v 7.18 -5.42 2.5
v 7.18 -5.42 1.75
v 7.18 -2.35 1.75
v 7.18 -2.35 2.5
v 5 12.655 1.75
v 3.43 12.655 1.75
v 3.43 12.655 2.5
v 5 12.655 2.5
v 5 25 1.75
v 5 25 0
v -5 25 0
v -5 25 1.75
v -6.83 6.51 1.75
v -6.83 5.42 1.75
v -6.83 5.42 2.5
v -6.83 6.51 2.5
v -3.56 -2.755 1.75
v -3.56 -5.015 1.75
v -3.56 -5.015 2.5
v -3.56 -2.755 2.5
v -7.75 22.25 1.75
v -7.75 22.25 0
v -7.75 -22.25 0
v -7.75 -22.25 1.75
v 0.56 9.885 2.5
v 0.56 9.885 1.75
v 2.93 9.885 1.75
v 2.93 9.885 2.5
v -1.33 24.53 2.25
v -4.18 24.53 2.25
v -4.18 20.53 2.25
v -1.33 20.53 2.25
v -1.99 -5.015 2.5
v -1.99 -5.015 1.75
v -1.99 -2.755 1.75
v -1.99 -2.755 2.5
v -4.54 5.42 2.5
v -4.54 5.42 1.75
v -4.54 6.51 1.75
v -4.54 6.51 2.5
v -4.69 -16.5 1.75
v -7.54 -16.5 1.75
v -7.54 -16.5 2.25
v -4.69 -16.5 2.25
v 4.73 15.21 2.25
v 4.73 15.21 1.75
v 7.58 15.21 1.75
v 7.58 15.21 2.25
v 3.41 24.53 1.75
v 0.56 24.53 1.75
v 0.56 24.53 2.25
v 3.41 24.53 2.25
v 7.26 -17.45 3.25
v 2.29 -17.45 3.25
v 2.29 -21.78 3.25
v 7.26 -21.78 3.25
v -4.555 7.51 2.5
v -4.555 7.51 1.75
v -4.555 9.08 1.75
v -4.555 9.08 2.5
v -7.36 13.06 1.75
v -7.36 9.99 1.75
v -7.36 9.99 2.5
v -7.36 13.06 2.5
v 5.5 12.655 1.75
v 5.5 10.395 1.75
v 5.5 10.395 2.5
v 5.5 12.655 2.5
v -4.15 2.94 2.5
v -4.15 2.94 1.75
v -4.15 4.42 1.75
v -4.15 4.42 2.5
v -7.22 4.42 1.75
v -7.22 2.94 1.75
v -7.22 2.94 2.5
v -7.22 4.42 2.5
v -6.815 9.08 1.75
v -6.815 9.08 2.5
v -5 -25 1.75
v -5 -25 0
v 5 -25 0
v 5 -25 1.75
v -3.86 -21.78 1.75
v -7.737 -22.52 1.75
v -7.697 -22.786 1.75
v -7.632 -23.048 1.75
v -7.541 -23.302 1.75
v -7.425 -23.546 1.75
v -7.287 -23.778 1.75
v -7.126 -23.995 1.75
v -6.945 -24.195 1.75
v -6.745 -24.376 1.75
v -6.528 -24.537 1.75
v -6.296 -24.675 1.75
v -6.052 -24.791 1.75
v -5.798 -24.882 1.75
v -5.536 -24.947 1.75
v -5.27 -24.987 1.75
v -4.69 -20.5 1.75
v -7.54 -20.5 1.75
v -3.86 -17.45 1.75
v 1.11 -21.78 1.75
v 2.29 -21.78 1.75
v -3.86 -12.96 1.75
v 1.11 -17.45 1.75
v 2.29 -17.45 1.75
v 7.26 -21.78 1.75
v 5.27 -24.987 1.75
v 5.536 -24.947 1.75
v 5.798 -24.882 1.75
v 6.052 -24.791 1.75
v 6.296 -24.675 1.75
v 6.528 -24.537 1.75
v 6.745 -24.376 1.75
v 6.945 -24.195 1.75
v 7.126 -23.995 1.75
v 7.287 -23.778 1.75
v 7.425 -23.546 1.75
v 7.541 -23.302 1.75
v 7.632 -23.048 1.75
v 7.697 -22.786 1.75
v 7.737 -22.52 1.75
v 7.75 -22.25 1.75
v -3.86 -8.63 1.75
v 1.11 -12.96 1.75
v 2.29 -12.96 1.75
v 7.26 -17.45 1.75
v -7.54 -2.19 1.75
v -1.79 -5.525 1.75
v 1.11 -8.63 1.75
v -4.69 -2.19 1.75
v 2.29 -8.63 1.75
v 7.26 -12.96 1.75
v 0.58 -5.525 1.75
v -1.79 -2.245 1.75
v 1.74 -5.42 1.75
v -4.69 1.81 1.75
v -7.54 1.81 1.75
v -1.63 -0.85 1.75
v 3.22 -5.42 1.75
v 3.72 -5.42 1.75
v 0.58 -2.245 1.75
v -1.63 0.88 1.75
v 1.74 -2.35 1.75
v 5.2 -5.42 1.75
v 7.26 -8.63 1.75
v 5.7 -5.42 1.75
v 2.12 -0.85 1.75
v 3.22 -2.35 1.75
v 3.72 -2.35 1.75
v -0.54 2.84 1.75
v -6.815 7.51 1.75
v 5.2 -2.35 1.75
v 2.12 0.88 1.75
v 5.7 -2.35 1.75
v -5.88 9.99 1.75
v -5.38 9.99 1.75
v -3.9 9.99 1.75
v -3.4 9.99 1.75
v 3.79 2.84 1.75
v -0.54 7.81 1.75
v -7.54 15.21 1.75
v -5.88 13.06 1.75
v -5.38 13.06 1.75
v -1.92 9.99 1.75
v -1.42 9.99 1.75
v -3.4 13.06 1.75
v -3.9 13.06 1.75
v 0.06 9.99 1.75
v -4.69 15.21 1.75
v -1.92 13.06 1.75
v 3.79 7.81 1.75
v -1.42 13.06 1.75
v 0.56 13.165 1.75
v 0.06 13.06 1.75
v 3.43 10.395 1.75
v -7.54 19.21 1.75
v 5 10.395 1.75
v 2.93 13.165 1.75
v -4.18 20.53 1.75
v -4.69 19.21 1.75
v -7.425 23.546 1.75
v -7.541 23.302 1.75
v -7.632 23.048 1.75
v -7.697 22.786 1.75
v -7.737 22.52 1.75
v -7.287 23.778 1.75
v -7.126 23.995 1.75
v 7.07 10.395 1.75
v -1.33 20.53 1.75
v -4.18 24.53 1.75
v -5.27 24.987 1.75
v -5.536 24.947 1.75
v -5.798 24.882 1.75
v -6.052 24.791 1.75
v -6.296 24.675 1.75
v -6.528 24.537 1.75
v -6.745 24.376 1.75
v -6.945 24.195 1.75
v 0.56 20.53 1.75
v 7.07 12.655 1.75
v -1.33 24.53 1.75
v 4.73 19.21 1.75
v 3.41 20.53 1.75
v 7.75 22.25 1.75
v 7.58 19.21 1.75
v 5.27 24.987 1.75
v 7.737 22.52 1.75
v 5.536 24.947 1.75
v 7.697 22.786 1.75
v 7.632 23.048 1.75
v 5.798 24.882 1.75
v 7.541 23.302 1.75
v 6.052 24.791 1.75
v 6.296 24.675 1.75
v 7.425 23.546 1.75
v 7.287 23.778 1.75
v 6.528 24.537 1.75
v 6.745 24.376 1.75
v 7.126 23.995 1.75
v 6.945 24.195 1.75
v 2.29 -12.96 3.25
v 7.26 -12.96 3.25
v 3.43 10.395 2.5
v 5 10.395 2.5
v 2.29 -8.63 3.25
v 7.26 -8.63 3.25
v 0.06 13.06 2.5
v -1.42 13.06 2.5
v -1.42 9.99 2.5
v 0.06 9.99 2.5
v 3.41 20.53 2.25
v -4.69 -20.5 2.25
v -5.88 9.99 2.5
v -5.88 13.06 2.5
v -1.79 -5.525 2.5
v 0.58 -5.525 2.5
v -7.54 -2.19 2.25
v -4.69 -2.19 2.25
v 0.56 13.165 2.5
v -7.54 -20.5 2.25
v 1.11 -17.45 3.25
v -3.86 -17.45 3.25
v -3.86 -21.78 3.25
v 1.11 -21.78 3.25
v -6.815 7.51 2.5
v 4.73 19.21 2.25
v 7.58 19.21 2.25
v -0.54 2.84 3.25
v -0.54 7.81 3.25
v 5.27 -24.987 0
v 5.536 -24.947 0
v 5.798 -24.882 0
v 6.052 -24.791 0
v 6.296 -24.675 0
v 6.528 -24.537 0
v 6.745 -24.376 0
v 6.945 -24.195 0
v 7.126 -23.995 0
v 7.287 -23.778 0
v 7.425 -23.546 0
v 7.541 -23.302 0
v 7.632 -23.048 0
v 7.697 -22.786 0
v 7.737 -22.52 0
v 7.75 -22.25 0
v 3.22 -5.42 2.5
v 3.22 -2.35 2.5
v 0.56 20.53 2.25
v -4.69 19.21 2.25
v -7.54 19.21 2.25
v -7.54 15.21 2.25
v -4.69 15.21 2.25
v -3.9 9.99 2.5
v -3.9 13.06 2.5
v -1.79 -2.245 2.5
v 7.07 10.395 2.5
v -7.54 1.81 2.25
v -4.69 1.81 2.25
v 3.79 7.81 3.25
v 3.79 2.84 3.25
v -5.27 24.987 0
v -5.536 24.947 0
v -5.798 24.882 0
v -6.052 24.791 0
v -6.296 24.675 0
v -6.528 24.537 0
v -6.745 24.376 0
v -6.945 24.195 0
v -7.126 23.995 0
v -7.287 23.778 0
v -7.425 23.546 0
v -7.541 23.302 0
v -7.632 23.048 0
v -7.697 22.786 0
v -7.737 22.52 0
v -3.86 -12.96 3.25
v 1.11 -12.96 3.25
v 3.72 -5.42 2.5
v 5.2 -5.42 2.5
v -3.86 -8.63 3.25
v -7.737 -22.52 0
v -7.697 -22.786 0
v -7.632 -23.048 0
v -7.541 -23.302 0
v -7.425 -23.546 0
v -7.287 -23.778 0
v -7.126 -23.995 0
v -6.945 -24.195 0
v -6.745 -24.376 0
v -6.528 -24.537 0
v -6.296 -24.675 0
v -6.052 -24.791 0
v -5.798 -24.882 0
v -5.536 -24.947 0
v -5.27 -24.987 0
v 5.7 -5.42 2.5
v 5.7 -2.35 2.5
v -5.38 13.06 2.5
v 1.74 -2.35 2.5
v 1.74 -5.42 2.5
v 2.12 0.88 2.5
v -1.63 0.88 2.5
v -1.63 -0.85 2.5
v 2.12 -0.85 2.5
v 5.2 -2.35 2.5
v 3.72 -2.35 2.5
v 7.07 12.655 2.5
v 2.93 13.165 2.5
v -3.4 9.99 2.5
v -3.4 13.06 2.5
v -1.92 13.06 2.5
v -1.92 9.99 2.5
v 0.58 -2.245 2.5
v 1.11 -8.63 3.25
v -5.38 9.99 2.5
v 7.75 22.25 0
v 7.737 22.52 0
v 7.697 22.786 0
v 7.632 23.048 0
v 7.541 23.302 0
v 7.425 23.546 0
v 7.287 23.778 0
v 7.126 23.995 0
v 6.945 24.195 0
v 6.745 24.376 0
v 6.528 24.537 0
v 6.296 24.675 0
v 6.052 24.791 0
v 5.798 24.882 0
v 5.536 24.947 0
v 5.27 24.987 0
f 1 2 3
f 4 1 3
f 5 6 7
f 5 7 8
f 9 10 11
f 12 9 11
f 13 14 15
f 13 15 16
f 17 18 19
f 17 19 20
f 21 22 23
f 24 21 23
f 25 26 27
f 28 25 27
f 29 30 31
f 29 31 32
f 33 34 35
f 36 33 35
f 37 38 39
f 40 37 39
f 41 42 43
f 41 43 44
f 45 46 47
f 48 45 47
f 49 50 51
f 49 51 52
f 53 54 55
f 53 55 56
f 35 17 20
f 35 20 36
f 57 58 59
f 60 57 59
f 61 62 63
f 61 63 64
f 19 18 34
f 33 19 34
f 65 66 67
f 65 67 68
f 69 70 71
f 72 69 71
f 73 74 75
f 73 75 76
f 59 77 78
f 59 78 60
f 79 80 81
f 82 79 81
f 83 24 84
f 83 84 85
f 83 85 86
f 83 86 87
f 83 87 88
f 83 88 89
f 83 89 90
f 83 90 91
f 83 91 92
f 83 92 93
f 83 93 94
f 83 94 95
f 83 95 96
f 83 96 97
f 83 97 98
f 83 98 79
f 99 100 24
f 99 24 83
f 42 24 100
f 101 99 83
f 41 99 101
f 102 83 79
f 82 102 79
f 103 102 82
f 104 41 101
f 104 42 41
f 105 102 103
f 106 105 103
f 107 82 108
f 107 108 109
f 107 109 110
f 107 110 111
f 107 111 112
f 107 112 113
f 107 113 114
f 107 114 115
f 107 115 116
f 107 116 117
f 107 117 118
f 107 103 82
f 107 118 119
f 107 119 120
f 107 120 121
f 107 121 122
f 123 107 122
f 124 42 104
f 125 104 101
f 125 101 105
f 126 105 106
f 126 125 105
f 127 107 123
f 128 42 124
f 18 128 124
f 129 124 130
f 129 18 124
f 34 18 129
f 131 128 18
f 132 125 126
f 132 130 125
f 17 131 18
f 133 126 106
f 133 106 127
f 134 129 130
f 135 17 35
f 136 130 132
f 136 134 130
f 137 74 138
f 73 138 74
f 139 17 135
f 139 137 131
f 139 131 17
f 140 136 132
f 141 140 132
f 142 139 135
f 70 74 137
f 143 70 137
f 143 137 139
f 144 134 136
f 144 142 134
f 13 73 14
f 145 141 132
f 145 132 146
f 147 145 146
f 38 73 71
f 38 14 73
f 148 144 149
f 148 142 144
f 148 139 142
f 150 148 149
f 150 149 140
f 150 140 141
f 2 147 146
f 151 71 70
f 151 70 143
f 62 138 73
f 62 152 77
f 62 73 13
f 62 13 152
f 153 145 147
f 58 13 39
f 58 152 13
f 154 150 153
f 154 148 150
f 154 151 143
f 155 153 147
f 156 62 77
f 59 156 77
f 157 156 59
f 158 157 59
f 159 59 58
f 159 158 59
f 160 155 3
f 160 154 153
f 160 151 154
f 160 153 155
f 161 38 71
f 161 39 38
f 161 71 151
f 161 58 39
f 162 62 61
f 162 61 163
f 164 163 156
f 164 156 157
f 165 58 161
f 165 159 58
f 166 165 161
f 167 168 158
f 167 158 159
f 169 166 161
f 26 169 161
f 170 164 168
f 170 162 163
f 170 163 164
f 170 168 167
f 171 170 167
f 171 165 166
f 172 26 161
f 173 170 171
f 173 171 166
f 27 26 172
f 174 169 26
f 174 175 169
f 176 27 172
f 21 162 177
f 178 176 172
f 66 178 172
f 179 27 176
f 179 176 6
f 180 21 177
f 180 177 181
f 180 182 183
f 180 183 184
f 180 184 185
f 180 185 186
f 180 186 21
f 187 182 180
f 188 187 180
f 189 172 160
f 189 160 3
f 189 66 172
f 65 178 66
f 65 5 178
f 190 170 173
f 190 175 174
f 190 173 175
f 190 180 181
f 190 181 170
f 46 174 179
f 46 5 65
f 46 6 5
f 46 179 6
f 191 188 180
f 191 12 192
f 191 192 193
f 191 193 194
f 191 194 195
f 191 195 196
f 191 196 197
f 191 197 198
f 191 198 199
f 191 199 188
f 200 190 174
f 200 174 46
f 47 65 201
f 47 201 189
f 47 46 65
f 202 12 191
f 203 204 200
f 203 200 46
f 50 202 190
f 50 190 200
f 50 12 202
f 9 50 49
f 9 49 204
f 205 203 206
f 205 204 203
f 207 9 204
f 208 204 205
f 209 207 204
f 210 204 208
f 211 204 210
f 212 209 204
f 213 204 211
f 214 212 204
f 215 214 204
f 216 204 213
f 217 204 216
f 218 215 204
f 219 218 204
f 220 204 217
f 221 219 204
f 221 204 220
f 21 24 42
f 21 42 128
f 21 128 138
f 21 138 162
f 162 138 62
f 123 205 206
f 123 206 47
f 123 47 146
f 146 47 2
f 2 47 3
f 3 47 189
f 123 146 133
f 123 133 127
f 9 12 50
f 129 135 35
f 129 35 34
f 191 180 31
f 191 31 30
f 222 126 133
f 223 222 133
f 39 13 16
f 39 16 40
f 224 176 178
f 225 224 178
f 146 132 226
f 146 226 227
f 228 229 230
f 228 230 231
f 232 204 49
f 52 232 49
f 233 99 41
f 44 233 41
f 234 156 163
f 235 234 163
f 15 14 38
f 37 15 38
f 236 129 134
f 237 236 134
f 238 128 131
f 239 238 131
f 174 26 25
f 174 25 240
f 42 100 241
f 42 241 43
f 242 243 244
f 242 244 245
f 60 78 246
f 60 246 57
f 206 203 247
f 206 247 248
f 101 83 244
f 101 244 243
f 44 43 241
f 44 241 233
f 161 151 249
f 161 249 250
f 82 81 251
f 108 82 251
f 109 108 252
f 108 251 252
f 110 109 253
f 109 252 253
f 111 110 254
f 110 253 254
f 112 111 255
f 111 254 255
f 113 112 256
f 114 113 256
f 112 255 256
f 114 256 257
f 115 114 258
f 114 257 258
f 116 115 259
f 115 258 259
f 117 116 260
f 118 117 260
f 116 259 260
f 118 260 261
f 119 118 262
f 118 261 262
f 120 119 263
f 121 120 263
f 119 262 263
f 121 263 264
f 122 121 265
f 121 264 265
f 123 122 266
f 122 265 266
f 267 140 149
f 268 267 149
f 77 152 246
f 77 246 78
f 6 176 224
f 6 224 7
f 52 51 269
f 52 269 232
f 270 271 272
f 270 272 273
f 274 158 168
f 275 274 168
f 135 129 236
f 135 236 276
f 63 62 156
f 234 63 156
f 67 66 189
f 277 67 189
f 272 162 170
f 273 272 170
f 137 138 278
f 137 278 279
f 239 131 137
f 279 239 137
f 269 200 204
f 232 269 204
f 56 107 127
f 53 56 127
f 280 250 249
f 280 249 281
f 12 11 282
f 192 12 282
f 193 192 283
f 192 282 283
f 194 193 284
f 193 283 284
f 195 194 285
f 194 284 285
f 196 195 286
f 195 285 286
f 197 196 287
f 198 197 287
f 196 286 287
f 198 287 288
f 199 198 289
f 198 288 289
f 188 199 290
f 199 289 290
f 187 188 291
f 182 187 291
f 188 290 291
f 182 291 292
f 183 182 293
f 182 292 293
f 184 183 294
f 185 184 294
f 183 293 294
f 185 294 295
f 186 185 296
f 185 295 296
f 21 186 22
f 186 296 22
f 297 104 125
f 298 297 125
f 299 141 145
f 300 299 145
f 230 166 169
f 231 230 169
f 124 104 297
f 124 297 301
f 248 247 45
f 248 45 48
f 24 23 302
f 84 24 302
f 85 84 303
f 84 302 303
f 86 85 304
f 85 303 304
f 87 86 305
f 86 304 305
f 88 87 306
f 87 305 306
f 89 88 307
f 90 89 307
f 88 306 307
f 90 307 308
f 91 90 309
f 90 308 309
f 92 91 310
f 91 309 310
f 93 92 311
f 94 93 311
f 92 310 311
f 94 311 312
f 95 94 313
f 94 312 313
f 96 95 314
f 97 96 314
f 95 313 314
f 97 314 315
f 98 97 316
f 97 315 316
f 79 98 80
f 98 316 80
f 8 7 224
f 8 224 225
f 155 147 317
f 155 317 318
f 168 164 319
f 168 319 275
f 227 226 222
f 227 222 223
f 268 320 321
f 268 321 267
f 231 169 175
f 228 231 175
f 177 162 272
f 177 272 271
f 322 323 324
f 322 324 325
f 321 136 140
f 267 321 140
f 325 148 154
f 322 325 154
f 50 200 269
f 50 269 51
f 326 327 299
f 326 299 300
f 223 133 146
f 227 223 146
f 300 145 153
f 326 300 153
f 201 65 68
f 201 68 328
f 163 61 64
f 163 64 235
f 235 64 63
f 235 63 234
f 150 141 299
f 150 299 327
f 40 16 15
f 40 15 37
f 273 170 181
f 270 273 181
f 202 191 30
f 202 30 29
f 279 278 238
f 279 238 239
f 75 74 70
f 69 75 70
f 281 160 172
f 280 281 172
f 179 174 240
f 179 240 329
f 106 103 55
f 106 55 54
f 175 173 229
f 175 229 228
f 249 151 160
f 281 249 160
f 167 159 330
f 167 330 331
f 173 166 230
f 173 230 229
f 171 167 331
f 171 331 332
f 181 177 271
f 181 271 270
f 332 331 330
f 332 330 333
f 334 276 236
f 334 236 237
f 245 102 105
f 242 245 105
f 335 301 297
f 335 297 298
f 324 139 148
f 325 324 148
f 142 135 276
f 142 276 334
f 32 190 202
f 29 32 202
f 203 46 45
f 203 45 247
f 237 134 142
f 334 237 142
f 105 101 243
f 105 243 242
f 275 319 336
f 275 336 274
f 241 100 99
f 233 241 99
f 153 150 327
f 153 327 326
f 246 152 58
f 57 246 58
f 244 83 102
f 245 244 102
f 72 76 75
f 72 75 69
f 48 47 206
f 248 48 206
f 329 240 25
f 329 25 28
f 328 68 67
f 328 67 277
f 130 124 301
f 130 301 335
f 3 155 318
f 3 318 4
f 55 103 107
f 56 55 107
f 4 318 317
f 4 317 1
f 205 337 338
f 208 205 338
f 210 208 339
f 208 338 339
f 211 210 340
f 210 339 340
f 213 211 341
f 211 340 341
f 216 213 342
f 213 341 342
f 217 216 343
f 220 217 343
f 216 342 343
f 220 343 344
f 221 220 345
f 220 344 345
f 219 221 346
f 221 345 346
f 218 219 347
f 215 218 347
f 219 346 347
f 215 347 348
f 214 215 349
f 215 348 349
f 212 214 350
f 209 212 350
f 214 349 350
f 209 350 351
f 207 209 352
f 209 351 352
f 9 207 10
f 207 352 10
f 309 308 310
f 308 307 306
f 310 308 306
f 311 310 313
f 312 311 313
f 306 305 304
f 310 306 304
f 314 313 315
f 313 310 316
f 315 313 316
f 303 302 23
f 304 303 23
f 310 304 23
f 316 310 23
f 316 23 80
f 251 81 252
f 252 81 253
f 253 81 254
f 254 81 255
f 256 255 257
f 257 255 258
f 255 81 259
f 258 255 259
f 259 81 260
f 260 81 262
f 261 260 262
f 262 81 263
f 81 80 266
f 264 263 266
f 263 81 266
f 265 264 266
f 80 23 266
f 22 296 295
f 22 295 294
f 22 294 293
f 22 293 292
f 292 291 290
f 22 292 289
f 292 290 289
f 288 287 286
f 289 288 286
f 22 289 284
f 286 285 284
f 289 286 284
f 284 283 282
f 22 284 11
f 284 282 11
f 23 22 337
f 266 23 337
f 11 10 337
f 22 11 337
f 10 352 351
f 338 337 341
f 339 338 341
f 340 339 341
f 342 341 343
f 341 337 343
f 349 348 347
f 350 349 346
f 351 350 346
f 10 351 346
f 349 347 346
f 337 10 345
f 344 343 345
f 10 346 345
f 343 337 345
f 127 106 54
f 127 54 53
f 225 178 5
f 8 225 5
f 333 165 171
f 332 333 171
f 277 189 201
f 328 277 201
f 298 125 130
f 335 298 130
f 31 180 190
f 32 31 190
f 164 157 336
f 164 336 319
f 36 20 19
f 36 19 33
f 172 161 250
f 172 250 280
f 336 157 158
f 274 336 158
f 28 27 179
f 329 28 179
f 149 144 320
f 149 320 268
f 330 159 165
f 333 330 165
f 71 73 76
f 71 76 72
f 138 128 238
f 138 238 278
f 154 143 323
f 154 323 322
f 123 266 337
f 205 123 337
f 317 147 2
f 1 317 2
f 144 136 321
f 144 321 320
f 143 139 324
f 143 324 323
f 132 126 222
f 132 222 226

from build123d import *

# Parameters (mm, degrees)
PAD_DEPTH     = 1.75
SKETCH001_W   = 2.85
SKETCH001_H   = 4
PAD001_DEPTH  = 0.5
SKETCH002_W   = 4.33
SKETCH002_H   = 4.97
SKETCH002_W_2 = 4.97
SKETCH002_H_2 = 4.33
PAD002_DEPTH  = 1.5
SKETCH003_W   = 1.57
SKETCH003_H   = 2.26
SKETCH003_W_2 = 2.37
SKETCH003_H_2 = 3.28
SKETCH003_W_3 = 1.48
SKETCH003_H_3 = 3.07
SKETCH003_W_4 = 2.29
SKETCH003_H_4 = 1.09
SKETCH003_W_5 = 2.26
SKETCH003_H_5 = 1.57
SKETCH003_W_6 = 3.07
SKETCH003_H_6 = 1.48
SKETCH003_W_7 = 3.75
SKETCH003_H_7 = 1.73
PAD003_DEPTH  = 0.75


with BuildPart() as part:
    # Sketch → Pad (new body)
    with BuildSketch(Plane.XY):
        with BuildLine():
            Line((-7.75, 22.25), (-7.75, -22.25))
            ThreePointArc((-7.75, -22.25), (-6.944544, -24.194544), (-5, -25))
            Line((-5, -25), (5, -25))
            ThreePointArc((5, -25), (6.944544, -24.194544), (7.75, -22.25))
            Line((7.75, -22.25), (7.75, 22.25))
            ThreePointArc((7.75, 22.25), (6.944544, 24.194544), (5, 25))
            Line((5, 25), (-5, 25))
            ThreePointArc((-5, 25), (-6.944544, 24.194544), (-7.75, 22.25))
        make_face()
    extrude(amount=PAD_DEPTH)

    # Sketch001 (on Face10 of Pad) → Pad001 (join)
    with BuildSketch(Plane.XY.offset(1.75)):
        with Locations((-6.115, 17.21)):
            Rectangle(SKETCH001_W, SKETCH001_H)
        with Locations((-2.755, 22.53)):
            Rectangle(SKETCH001_W, SKETCH001_H)
        with Locations((1.985, 22.53)):
            Rectangle(SKETCH001_W, SKETCH001_H)
        with Locations((6.155, 17.21)):
            Rectangle(SKETCH001_W, SKETCH001_H)
        with Locations((-6.115, -0.19)):
            Rectangle(SKETCH001_W, SKETCH001_H)
        with Locations((-6.115, -18.5)):
            Rectangle(SKETCH001_W, SKETCH001_H)
    extrude(amount=PAD001_DEPTH)

    # Sketch002 (on Face5 of Pad001) → Pad002 (join)
    with BuildSketch(Plane.XY.offset(1.75)):
        with Locations((1.625, 5.325)):
            Rectangle(SKETCH002_W, SKETCH002_H)
        with Locations((-1.375, -10.795)):
            Rectangle(SKETCH002_W_2, SKETCH002_H_2)
        with Locations((4.775, -10.795)):
            Rectangle(SKETCH002_W_2, SKETCH002_H_2)
        with Locations((-1.375, -19.615)):
            Rectangle(SKETCH002_W_2, SKETCH002_H_2)
        with Locations((4.775, -19.615)):
            Rectangle(SKETCH002_W_2, SKETCH002_H_2)
    extrude(amount=PAD002_DEPTH)

    # Sketch003 (on Face5 of Pad002) → Pad003 (join)
    with BuildSketch(Plane.XY.offset(1.75)):
        with Locations((-2.775, -3.885)):
            Rectangle(SKETCH003_W, SKETCH003_H)
        with Locations((-0.605, -3.885)):
            Rectangle(SKETCH003_W_2, SKETCH003_H_2)
        with Locations((2.48, -3.885)):
            Rectangle(SKETCH003_W_3, SKETCH003_H_3)
        with Locations((4.46, -3.885)):
            Rectangle(SKETCH003_W_3, SKETCH003_H_3)
        with Locations((6.44, -3.885)):
            Rectangle(SKETCH003_W_3, SKETCH003_H_3)
        with Locations((-5.685, 5.965)):
            Rectangle(SKETCH003_W_4, SKETCH003_H_4)
        with Locations((-5.685, 8.295)):
            Rectangle(SKETCH003_W_5, SKETCH003_H_5)
        with Locations((-5.685, 3.68)):
            Rectangle(SKETCH003_W_6, SKETCH003_H_6)
        with Locations((-6.62, 11.525)):
            Rectangle(SKETCH003_W_3, SKETCH003_H_3)
        with Locations((-4.64, 11.525)):
            Rectangle(SKETCH003_W_3, SKETCH003_H_3)
        with Locations((-2.66, 11.525)):
            Rectangle(SKETCH003_W_3, SKETCH003_H_3)
        with Locations((-0.68, 11.525)):
            Rectangle(SKETCH003_W_3, SKETCH003_H_3)
        with Locations((1.745, 11.525)):
            Rectangle(SKETCH003_W_2, SKETCH003_H_2)
        with Locations((4.215, 11.525)):
            Rectangle(SKETCH003_W, SKETCH003_H)
        with Locations((6.285, 11.525)):
            Rectangle(SKETCH003_W, SKETCH003_H)
        with Locations((0.245, 0.015)):
            Rectangle(SKETCH003_W_7, SKETCH003_H_7)
    extrude(amount=PAD003_DEPTH)


solid = part.part
